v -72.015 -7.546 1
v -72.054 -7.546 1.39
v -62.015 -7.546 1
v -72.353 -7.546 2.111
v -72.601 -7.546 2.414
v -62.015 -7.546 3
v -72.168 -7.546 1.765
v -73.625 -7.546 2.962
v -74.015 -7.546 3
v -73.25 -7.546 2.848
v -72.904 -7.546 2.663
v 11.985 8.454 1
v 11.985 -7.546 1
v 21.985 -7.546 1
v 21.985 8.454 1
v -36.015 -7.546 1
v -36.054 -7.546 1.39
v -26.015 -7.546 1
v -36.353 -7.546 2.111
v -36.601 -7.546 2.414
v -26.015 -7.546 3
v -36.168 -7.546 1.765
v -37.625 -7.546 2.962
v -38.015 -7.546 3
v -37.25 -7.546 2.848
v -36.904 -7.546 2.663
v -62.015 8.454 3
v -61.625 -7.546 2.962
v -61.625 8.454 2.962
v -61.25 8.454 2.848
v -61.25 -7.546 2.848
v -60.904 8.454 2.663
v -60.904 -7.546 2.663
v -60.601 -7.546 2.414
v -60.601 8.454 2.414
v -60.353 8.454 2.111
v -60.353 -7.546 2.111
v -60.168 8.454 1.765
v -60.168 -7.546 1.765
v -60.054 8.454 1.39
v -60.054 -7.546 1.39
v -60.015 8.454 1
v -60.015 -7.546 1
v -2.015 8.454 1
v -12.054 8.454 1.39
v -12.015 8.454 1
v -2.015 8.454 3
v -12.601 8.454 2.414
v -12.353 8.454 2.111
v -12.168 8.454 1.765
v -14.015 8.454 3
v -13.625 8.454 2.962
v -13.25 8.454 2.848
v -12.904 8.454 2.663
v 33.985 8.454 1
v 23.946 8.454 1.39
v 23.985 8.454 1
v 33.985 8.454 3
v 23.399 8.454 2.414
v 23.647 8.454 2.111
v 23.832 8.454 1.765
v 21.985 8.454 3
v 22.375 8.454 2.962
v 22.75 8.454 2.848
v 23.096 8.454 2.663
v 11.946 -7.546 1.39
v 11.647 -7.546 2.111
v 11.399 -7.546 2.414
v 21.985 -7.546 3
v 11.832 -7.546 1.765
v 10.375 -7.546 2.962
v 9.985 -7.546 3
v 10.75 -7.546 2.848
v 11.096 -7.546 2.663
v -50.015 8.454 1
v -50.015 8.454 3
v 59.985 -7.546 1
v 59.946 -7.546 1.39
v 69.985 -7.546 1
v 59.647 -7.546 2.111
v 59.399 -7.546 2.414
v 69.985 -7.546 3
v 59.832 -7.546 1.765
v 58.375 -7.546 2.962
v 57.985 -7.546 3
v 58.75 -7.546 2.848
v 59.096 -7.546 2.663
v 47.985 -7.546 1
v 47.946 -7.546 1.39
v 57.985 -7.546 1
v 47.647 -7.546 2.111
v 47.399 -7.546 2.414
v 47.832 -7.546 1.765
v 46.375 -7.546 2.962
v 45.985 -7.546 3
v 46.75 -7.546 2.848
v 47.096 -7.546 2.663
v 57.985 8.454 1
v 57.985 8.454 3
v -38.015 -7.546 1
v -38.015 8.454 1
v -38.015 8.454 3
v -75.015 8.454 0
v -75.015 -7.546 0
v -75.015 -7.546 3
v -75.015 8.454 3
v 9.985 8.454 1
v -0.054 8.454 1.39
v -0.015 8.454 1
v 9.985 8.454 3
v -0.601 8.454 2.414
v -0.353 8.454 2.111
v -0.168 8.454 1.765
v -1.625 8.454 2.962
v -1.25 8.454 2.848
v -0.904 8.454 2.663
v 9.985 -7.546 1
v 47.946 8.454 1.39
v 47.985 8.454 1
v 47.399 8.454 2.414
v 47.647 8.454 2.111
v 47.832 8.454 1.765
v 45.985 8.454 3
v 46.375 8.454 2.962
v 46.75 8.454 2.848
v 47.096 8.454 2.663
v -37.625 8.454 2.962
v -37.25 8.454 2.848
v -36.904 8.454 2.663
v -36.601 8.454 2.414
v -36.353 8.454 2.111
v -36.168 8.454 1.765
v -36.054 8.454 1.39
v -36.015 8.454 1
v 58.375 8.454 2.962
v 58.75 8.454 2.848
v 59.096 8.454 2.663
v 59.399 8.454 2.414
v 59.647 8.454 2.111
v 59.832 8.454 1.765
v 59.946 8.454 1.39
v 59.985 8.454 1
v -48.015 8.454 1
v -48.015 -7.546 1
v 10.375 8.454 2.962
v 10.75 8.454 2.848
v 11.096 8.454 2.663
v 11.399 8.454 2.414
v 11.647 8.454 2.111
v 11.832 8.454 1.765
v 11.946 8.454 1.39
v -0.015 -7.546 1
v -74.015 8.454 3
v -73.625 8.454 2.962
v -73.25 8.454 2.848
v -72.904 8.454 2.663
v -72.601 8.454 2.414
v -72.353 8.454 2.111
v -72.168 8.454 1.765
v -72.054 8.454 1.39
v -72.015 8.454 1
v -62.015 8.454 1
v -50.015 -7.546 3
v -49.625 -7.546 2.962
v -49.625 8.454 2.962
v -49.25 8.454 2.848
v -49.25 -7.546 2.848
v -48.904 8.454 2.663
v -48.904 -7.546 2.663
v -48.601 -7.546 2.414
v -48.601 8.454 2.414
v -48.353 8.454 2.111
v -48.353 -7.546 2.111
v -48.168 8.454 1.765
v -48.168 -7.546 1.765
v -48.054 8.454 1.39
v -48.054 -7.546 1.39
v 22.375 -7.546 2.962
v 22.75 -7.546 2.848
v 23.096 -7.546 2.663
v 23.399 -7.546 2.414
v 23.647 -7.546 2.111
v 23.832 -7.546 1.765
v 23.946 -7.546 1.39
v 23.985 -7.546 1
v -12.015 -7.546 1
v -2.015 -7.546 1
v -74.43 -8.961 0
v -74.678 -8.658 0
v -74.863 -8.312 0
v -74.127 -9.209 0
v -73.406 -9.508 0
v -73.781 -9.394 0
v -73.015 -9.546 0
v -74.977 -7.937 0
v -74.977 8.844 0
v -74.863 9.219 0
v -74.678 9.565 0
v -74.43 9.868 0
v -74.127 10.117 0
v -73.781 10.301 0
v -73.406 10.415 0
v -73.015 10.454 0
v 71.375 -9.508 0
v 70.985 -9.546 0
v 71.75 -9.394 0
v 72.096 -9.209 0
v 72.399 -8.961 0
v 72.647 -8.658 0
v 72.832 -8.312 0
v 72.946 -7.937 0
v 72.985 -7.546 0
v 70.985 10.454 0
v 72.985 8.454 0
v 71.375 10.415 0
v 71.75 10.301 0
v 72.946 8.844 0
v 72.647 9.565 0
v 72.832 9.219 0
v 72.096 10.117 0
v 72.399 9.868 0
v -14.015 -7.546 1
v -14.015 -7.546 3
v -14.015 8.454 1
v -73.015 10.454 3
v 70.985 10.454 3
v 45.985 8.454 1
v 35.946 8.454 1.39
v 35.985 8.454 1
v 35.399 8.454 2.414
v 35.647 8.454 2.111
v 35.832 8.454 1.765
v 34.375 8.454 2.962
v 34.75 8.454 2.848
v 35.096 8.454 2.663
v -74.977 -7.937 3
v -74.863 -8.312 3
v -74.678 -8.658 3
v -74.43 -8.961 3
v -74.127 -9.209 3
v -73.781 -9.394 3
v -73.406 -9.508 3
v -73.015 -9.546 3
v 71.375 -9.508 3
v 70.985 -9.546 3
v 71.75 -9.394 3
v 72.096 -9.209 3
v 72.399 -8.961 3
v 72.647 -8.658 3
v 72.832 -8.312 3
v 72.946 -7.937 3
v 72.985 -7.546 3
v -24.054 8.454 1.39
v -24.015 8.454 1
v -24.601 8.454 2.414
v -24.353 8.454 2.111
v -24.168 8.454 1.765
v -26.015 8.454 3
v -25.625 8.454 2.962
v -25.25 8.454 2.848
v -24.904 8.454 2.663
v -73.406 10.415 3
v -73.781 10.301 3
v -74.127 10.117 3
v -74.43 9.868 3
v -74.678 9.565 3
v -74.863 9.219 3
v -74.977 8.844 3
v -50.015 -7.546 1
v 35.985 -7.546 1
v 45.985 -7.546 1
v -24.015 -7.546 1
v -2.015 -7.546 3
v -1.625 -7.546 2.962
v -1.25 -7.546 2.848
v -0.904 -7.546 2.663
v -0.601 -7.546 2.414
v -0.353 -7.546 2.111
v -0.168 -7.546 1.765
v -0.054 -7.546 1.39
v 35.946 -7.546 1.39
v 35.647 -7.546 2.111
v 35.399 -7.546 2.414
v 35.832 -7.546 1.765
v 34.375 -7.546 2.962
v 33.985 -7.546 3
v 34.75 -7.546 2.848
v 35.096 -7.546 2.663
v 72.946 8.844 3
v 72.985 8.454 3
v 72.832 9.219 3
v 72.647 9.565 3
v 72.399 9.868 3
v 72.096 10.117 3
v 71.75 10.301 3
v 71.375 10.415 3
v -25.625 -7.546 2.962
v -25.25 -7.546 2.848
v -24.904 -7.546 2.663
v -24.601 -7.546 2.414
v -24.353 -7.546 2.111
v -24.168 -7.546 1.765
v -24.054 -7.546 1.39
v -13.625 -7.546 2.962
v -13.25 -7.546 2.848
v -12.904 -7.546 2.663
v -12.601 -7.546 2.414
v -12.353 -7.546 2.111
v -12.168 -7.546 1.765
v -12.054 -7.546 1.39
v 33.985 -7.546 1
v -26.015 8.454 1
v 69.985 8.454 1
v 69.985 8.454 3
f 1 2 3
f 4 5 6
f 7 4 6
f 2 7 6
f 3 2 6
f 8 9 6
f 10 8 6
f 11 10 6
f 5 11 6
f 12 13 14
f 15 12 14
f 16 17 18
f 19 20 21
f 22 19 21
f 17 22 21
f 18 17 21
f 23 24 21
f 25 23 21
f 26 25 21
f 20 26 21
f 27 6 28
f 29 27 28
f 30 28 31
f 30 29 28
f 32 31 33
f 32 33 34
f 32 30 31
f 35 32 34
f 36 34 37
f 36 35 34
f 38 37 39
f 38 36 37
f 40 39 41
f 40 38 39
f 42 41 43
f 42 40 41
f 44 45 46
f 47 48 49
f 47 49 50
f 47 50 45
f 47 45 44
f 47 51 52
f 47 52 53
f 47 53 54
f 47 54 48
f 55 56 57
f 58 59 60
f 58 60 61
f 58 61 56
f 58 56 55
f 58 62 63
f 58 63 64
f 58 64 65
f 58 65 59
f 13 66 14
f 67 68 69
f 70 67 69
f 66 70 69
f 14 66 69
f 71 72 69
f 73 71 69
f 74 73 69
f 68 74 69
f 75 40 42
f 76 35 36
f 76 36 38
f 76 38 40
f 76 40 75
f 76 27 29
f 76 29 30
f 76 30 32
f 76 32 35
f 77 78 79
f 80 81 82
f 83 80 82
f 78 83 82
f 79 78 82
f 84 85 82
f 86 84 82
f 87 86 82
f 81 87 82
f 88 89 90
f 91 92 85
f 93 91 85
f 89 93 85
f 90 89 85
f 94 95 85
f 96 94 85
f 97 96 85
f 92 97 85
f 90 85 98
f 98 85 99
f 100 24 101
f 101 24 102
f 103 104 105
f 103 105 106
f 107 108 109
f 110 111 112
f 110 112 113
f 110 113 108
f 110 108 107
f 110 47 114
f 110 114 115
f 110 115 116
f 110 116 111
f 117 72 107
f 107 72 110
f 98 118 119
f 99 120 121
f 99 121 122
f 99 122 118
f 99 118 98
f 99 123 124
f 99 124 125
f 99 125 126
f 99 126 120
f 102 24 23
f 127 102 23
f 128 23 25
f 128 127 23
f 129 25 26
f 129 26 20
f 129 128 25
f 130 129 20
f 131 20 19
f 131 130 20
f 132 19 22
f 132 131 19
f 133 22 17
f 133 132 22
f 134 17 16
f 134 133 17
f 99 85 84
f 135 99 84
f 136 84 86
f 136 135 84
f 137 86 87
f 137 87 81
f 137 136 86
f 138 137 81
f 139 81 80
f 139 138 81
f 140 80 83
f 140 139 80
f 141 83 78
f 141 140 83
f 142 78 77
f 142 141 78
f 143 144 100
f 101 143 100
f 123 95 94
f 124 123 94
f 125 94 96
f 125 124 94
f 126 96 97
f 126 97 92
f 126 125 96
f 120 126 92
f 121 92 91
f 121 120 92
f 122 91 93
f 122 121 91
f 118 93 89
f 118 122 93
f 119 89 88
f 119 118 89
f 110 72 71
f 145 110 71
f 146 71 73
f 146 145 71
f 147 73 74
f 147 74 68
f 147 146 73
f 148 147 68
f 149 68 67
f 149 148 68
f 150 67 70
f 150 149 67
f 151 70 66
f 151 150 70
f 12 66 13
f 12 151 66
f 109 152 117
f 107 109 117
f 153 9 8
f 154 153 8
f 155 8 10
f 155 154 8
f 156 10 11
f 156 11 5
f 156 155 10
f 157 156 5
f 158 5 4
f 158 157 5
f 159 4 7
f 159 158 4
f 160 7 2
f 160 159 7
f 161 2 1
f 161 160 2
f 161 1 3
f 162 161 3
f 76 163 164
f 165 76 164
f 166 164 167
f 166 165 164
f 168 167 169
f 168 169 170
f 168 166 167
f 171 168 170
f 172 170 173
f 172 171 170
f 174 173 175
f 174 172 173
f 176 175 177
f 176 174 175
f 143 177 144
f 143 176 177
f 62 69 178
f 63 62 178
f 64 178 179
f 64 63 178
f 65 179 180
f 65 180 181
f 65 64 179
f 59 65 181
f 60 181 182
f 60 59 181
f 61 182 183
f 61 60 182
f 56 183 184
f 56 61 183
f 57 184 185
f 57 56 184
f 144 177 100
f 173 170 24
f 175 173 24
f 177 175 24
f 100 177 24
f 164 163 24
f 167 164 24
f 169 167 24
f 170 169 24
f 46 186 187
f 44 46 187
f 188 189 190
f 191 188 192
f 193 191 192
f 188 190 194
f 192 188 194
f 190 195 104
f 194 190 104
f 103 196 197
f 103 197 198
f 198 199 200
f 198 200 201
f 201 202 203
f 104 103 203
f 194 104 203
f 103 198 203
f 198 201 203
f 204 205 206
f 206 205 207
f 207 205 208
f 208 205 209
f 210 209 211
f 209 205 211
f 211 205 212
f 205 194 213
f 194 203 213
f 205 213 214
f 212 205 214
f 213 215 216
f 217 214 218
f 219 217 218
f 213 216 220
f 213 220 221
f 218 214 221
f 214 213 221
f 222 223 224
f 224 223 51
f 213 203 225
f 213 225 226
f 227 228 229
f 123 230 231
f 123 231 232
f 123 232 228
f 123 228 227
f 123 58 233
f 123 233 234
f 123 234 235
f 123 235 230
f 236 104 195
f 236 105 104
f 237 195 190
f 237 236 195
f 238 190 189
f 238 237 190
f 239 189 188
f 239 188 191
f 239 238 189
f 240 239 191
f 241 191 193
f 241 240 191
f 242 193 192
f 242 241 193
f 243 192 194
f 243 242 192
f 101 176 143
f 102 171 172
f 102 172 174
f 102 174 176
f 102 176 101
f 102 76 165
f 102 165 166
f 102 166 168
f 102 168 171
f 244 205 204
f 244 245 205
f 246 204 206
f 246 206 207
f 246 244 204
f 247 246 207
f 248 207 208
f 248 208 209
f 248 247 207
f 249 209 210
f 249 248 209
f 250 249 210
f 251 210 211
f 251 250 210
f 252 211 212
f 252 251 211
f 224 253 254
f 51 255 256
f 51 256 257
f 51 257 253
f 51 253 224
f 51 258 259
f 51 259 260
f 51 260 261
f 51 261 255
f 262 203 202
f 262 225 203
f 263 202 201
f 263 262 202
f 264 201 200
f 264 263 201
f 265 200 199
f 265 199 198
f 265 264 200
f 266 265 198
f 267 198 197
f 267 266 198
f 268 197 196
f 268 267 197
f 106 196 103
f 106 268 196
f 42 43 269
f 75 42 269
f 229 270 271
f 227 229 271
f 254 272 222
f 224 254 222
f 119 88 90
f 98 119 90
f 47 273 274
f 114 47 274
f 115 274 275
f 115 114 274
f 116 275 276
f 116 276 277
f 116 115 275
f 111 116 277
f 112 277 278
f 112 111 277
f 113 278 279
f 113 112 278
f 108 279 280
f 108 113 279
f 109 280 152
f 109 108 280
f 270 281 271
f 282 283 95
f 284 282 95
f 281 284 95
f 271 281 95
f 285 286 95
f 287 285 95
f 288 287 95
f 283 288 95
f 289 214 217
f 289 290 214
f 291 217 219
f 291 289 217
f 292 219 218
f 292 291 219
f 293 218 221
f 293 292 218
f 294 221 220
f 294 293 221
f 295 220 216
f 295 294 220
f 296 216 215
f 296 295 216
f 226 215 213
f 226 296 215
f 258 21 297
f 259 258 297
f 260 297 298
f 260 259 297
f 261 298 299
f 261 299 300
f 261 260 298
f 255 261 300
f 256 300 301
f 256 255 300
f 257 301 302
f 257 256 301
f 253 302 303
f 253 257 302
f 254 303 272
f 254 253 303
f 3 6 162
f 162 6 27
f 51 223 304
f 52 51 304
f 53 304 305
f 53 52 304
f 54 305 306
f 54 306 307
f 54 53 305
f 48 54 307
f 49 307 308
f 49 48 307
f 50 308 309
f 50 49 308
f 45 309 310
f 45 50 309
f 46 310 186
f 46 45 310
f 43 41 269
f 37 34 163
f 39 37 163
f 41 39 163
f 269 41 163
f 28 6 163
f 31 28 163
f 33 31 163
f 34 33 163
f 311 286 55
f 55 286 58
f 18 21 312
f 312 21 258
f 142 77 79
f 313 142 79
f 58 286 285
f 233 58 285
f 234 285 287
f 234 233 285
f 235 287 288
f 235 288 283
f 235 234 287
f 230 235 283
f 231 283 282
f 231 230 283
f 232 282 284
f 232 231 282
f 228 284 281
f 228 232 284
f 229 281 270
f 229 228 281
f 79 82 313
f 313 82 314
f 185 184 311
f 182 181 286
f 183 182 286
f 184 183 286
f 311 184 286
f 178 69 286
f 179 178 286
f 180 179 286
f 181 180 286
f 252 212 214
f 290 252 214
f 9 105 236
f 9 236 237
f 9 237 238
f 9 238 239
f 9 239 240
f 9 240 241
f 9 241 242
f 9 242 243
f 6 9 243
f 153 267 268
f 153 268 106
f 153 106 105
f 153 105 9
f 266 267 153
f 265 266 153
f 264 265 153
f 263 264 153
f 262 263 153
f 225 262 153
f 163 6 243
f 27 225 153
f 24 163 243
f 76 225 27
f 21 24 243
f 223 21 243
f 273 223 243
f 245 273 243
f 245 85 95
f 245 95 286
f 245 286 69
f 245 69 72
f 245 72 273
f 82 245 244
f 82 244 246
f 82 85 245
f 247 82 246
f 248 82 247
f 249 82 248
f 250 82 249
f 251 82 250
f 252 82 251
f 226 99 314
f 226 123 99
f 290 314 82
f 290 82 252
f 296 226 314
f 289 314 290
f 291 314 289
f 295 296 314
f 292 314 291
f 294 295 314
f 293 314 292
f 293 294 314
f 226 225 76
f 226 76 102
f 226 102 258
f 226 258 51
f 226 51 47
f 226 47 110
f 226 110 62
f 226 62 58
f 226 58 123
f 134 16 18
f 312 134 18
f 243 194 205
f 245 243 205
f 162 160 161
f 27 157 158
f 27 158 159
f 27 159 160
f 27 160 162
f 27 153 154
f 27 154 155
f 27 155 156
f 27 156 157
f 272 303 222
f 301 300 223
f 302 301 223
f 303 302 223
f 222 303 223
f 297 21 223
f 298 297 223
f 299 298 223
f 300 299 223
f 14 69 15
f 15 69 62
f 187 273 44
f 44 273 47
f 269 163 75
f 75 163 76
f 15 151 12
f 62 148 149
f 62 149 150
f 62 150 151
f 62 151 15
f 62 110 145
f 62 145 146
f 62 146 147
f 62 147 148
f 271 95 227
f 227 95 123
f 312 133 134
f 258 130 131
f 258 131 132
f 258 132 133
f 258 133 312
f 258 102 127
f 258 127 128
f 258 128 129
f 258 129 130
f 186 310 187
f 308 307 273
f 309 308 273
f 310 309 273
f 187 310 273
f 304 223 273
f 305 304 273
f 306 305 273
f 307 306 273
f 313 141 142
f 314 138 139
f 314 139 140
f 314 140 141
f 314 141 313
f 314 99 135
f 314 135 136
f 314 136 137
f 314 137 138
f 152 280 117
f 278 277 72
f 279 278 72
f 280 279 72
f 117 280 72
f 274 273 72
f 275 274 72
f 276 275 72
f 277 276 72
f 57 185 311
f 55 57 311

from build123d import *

# Parameters (mm, degrees)
F0_W     = 148
F0_H     = 20
F1_DEPTH = 3
F2_W     = 10
F2_H     = 16
F3_DEPTH = 2
F4_R     = 2
F4_R_2   = 1.99999


# Not quite as in the source:
# - a fillet or chamfer is up to 0.001 mm smaller than in the source, because OpenCascade refuses the exact size


with BuildPart() as f1:
    # F0 (on Top) → F1 (new body)
    with BuildSketch(Plane.XY):
        with Locations((-1.0154450944, 0.4536062479)):
            Rectangle(F0_W, F0_H)
    extrude(amount=F1_DEPTH)

    # F2 (on face) → F3 (cut)
    with BuildSketch(Plane.XY.offset(3)):
        with Locations((-67.0154450944, 0.4536062479)):
            Rectangle(F2_W, F2_H)
        with Locations((-55.0154450944, 0.4536062479)):
            Rectangle(F2_W, F2_H)
        with Locations((-43.0154450944, 0.4536062479)):
            Rectangle(F2_W, F2_H)
        with Locations((-31.0154450944, 0.4536062479)):
            Rectangle(F2_W, F2_H)
        with Locations((-19.0154450944, 0.4536062479)):
            Rectangle(F2_W, F2_H)
        with Locations((-7.0154450944, 0.4536062479)):
            Rectangle(F2_W, F2_H)
        with Locations((4.9845549056, 0.4536062479)):
            Rectangle(F2_W, F2_H)
        with Locations((16.9845549056, 0.4536062479)):
            Rectangle(F2_W, F2_H)
        with Locations((28.9845549056, 0.4536062479)):
            Rectangle(F2_W, F2_H)
        with Locations((40.9845549056, 0.4536062479)):
            Rectangle(F2_W, F2_H)
        with Locations((52.9845549056, 0.4536062479)):
            Rectangle(F2_W, F2_H)
        with Locations((64.9845549056, 0.4536062479)):
            Rectangle(F2_W, F2_H)
    extrude(amount=-F3_DEPTH, mode=Mode.SUBTRACT)

    # F4 (call 1 of 16: OpenCascade refuses the feature's edges together)
    f4_edges = [f1.edges().sort_by_distance(p)[0] for p in [
        (-75.015445, -9.546394, 1.5),
    ]]
    fillet(f4_edges, radius=F4_R)

    # F4#2 (call 2 of 16)
    f4_2_edges = [f1.edges().sort_by_distance(p)[0] for p in [
        (72.984555, -9.546394, 1.5),
    ]]
    fillet(f4_2_edges, radius=F4_R)

    # F4#3 (call 3 of 16)
    f4_3_edges = [f1.edges().sort_by_distance(p)[0] for p in [
        (72.984555, 10.453606, 1.5),
    ]]
    fillet(f4_3_edges, radius=F4_R)

    # F4#4 (call 4 of 16)
    f4_4_edges = [f1.edges().sort_by_distance(p)[0] for p in [
        (-75.015445, 10.453606, 1.5),
    ]]
    fillet(f4_4_edges, radius=F4_R)

    # F4#5 (call 5 of 16) (radius 2 in the source; OpenCascade refuses exactly that, so slightly less here)
    f4_5_edges = [f1.edges().sort_by_distance(p)[0] for p in [
        (-72.015445, 0.453606, 3),
    ]]
    fillet(f4_5_edges, radius=F4_R_2)

    # F4#6 (call 6 of 16) (radius 2 in the source; OpenCascade refuses exactly that, so slightly less here)
    f4_6_edges = [f1.edges().sort_by_distance(p)[0] for p in [
        (-60.015445, 0.453606, 3),
    ]]
    fillet(f4_6_edges, radius=F4_R_2)

    # F4#7 (call 7 of 16) (radius 2 in the source; OpenCascade refuses exactly that, so slightly less here)
    f4_7_edges = [f1.edges().sort_by_distance(p)[0] for p in [
        (-48.015445, 0.453606, 3),
    ]]
    fillet(f4_7_edges, radius=F4_R_2)

    # F4#8 (call 8 of 16) (radius 2 in the source; OpenCascade refuses exactly that, so slightly less here)
    f4_8_edges = [f1.edges().sort_by_distance(p)[0] for p in [
        (-36.015445, 0.453606, 3),
    ]]
    fillet(f4_8_edges, radius=F4_R_2)

    # F4#9 (call 9 of 16) (radius 2 in the source; OpenCascade refuses exactly that, so slightly less here)
    f4_9_edges = [f1.edges().sort_by_distance(p)[0] for p in [
        (-24.015445, 0.453606, 3),
    ]]
    fillet(f4_9_edges, radius=F4_R_2)

    # F4#10 (call 10 of 16) (radius 2 in the source; OpenCascade refuses exactly that, so slightly less here)
    f4_10_edges = [f1.edges().sort_by_distance(p)[0] for p in [
        (-12.015445, 0.453606, 3),
    ]]
    fillet(f4_10_edges, radius=F4_R_2)

    # F4#11 (call 11 of 16) (radius 2 in the source; OpenCascade refuses exactly that, so slightly less here)
    f4_11_edges = [f1.edges().sort_by_distance(p)[0] for p in [
        (-0.015445, 0.453606, 3),
    ]]
    fillet(f4_11_edges, radius=F4_R_2)

    # F4#12 (call 12 of 16) (radius 2 in the source; OpenCascade refuses exactly that, so slightly less here)
    f4_12_edges = [f1.edges().sort_by_distance(p)[0] for p in [
        (11.984555, 0.453606, 3),
    ]]
    fillet(f4_12_edges, radius=F4_R_2)

    # F4#13 (call 13 of 16) (radius 2 in the source; OpenCascade refuses exactly that, so slightly less here)
    f4_13_edges = [f1.edges().sort_by_distance(p)[0] for p in [
        (23.984555, 0.453606, 3),
    ]]
    fillet(f4_13_edges, radius=F4_R_2)

    # F4#14 (call 14 of 16) (radius 2 in the source; OpenCascade refuses exactly that, so slightly less here)
    f4_14_edges = [f1.edges().sort_by_distance(p)[0] for p in [
        (35.984555, 0.453606, 3),
    ]]
    fillet(f4_14_edges, radius=F4_R_2)

    # F4#15 (call 15 of 16) (radius 2 in the source; OpenCascade refuses exactly that, so slightly less here)
    f4_15_edges = [f1.edges().sort_by_distance(p)[0] for p in [
        (47.984555, 0.453606, 3),
    ]]
    fillet(f4_15_edges, radius=F4_R_2)

    # F4#16 (call 16 of 16) (radius 2 in the source; OpenCascade refuses exactly that, so slightly less here)
    f4_16_edges = [f1.edges().sort_by_distance(p)[0] for p in [
        (59.984555, 0.453606, 3),
    ]]
    fillet(f4_16_edges, radius=F4_R_2)


solid = f1.part
